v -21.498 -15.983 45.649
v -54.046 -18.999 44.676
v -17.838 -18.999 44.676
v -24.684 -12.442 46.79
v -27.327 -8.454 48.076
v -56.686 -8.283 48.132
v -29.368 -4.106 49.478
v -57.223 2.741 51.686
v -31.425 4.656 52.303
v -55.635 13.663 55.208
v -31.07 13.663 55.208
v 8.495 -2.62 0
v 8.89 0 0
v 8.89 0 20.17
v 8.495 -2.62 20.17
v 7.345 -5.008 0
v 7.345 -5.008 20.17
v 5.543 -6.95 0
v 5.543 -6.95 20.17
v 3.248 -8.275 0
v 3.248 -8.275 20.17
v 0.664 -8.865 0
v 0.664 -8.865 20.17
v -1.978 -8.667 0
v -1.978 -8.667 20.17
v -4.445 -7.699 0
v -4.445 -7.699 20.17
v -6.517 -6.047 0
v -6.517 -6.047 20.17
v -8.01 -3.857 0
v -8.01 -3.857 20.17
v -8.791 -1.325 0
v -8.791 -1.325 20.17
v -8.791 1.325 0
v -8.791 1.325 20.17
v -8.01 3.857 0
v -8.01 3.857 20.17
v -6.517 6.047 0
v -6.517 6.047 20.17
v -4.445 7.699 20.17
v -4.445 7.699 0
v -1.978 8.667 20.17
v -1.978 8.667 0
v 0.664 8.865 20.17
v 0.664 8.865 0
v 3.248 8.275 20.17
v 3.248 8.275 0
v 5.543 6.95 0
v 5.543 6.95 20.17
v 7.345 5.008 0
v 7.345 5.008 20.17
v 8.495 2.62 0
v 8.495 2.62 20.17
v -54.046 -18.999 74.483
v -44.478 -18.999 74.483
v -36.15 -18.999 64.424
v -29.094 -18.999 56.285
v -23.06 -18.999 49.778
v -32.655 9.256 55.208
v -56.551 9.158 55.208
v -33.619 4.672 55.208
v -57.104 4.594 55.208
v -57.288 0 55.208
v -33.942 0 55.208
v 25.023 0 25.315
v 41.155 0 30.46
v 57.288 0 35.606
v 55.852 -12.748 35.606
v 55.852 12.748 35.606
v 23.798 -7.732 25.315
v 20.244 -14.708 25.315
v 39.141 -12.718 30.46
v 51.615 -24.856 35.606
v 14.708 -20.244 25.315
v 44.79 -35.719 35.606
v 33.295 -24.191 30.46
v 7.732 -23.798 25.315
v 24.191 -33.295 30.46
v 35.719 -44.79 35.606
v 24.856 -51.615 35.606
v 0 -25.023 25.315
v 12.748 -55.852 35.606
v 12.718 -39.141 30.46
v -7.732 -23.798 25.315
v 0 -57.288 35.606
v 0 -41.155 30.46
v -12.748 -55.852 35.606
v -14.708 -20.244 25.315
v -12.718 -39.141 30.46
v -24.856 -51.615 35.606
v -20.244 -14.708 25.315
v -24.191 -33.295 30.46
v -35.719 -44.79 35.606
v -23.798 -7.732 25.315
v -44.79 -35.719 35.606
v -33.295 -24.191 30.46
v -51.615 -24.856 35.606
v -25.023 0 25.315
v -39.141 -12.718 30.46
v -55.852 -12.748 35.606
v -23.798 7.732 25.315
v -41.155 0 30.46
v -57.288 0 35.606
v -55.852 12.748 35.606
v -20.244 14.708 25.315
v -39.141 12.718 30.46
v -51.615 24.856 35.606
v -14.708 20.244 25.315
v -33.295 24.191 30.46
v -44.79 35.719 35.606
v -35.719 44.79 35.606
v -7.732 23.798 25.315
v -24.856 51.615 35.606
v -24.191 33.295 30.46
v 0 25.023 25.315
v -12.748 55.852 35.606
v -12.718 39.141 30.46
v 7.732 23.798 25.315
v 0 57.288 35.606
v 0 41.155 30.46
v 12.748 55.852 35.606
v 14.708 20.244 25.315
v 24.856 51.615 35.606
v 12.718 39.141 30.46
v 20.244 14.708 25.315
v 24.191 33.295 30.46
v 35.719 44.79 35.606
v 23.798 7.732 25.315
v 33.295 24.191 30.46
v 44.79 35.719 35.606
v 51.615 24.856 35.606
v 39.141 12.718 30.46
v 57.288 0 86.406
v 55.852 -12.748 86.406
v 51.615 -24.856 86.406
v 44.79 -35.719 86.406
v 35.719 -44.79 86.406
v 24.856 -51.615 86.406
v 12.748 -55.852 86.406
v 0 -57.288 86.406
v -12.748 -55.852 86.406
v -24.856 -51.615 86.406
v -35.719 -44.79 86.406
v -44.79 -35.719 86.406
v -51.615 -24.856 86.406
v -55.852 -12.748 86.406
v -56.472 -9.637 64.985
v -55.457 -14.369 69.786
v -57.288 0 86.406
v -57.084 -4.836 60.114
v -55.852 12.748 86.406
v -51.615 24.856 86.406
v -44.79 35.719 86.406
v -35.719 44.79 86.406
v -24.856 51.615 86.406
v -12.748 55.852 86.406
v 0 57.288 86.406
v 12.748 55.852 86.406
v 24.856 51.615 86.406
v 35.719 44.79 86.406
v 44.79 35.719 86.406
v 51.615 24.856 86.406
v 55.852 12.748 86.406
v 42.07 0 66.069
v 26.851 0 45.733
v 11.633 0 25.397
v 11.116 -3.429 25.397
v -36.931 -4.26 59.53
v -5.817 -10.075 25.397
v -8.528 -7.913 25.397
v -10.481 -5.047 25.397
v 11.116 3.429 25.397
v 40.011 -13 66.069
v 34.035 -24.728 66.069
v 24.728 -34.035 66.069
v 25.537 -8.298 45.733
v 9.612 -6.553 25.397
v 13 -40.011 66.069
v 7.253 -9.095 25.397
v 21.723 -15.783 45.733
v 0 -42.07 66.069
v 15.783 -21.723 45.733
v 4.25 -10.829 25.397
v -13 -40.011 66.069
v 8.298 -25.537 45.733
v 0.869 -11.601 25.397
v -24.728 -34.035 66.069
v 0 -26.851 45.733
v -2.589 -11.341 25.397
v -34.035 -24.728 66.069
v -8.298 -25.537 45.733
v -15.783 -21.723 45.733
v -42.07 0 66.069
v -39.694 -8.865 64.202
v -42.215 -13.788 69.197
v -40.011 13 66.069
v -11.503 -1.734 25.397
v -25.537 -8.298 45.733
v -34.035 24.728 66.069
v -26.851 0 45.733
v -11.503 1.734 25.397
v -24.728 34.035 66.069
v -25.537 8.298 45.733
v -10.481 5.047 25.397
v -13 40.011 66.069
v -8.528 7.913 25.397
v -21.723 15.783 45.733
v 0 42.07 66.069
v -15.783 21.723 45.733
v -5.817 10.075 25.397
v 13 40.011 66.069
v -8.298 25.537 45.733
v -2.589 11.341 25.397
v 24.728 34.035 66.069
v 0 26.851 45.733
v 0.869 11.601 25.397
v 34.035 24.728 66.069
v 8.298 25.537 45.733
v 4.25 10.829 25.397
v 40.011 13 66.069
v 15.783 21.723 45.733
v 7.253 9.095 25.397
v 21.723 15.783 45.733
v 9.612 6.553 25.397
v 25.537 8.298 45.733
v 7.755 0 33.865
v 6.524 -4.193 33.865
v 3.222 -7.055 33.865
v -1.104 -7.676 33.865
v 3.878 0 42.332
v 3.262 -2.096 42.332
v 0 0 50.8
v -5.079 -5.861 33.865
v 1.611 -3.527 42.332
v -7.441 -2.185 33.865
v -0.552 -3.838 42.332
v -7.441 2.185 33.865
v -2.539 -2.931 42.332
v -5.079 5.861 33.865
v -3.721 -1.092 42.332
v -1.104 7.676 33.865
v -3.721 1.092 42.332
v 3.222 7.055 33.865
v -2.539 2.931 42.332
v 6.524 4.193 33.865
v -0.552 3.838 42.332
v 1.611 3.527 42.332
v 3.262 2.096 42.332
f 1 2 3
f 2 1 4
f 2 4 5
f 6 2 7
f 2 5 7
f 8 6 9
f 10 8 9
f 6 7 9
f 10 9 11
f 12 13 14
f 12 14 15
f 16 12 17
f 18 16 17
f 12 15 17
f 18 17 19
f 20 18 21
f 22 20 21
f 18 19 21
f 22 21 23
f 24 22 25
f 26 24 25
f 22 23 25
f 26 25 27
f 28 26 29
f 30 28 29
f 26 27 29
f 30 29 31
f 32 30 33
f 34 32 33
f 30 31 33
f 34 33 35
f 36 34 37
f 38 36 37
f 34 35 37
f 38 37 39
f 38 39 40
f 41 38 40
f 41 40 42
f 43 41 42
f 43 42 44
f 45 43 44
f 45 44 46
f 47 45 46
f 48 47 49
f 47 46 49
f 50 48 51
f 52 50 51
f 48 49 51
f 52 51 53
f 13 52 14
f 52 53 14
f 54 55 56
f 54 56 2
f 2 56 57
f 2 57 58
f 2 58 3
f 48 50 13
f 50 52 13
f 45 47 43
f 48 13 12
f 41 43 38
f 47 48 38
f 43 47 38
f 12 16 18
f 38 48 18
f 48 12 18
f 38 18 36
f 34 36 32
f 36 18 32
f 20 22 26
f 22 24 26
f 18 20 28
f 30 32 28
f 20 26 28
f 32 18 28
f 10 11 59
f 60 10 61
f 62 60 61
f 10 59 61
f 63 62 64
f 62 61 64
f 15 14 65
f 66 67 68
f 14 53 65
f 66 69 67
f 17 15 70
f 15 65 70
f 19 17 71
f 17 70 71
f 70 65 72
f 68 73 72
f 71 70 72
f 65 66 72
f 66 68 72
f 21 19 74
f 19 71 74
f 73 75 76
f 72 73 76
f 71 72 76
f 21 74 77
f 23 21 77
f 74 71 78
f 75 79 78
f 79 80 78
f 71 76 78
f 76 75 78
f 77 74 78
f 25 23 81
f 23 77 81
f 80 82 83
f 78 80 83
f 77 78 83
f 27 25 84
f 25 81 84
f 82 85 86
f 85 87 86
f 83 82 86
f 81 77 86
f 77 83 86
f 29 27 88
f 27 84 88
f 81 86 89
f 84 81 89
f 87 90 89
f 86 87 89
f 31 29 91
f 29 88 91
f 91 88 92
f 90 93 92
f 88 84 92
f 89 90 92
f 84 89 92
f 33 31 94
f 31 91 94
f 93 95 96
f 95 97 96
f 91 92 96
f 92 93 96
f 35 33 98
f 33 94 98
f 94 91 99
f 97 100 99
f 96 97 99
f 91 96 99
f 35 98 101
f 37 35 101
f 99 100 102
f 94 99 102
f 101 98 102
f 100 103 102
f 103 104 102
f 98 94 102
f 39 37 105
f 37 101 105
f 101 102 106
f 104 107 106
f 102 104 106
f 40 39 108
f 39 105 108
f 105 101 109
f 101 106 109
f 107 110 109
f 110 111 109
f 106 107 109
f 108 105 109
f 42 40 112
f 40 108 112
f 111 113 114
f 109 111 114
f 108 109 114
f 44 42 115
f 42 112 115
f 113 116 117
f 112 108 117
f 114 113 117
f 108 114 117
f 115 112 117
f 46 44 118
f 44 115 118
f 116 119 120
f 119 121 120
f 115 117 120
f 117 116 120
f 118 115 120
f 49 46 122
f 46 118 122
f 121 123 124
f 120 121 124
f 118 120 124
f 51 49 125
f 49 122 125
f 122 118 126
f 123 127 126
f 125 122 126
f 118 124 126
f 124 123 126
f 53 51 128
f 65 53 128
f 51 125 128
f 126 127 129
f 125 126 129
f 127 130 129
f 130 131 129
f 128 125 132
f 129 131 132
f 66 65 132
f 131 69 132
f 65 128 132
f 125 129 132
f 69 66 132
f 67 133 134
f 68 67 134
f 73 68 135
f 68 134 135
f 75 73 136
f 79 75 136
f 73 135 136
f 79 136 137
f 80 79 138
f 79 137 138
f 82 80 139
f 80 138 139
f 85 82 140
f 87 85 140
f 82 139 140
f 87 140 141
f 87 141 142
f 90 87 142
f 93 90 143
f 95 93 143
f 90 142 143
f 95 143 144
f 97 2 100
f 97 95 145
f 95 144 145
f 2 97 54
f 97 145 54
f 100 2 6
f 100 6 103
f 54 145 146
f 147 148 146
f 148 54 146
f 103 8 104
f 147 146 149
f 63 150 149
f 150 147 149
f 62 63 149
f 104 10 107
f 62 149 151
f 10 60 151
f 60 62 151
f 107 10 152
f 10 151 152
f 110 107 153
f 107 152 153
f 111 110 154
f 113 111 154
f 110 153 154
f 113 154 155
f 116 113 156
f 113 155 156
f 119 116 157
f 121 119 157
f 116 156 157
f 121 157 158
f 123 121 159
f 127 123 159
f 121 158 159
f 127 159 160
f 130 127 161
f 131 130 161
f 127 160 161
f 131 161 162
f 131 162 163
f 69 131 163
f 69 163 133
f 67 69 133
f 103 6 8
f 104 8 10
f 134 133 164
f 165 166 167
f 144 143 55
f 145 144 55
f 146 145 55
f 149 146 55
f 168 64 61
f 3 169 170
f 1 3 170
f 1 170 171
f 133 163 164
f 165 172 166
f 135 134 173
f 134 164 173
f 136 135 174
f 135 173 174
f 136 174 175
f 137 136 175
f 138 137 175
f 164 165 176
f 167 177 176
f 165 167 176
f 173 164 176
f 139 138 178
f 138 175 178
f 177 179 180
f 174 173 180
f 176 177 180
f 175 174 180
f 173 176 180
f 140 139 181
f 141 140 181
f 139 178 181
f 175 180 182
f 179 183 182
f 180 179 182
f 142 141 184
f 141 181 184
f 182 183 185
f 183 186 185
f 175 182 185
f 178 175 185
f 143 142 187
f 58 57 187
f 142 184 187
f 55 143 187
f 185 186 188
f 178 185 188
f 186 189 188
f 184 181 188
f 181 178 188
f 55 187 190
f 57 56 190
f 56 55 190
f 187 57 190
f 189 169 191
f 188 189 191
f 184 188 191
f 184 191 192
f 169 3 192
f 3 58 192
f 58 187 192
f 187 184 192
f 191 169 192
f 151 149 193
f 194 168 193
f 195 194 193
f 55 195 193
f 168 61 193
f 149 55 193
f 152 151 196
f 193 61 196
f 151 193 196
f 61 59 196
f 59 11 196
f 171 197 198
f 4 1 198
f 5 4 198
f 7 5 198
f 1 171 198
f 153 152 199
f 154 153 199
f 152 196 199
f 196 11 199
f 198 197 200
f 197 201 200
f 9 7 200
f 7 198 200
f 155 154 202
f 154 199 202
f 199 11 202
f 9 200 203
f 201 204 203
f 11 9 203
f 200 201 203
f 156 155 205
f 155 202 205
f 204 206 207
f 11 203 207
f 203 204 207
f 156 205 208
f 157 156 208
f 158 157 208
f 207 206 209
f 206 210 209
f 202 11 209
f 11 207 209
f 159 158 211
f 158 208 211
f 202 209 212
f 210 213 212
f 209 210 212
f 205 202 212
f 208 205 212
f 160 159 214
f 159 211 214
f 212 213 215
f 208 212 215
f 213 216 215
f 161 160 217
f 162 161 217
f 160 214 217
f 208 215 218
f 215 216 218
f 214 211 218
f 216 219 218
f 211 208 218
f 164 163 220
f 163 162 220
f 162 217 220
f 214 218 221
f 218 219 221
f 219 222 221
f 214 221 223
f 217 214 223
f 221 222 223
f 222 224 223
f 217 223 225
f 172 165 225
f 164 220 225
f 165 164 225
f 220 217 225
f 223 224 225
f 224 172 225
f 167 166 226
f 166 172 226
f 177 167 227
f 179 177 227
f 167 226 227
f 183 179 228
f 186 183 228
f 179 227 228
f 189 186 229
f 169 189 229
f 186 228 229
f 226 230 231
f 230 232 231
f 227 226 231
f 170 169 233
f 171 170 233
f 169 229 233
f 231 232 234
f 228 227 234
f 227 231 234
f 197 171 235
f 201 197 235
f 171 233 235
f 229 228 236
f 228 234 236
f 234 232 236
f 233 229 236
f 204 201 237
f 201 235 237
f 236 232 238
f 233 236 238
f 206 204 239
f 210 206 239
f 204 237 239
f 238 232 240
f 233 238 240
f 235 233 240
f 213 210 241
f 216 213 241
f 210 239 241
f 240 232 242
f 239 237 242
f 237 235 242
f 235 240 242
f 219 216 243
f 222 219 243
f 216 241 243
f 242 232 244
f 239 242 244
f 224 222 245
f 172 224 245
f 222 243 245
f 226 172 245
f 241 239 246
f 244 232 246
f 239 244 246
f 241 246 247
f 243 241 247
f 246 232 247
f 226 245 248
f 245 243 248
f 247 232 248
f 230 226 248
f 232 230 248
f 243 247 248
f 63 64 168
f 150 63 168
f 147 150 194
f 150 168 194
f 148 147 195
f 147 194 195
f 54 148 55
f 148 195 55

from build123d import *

# Parameters (mm, degrees)
F3_DEPTH = 160.02


with BuildPart() as f1:
    # F0 (on Front) → F1 (revolve)
    with BuildSketch(Plane.XZ):
        Polygon((11.633136, 25.396974), (0, 50.8), (0, 0), (8.89, 0), (8.89, 20.170162), (57.288211, 35.605614), (57.288211, 86.405614), align=None)
    revolve(axis=Axis((0, 0, 25.4), (0, 0, -1)))

    # F2 (on Right) → F3 (cut)
    with BuildSketch(Plane.YZ):
        Polygon((0, 55.20786), (-18.9991, 74.483134), (-18.9991, 44.67614), (13.663266, 55.20786), align=None)
    extrude(amount=-F3_DEPTH, mode=Mode.SUBTRACT)


solid = f1.part
